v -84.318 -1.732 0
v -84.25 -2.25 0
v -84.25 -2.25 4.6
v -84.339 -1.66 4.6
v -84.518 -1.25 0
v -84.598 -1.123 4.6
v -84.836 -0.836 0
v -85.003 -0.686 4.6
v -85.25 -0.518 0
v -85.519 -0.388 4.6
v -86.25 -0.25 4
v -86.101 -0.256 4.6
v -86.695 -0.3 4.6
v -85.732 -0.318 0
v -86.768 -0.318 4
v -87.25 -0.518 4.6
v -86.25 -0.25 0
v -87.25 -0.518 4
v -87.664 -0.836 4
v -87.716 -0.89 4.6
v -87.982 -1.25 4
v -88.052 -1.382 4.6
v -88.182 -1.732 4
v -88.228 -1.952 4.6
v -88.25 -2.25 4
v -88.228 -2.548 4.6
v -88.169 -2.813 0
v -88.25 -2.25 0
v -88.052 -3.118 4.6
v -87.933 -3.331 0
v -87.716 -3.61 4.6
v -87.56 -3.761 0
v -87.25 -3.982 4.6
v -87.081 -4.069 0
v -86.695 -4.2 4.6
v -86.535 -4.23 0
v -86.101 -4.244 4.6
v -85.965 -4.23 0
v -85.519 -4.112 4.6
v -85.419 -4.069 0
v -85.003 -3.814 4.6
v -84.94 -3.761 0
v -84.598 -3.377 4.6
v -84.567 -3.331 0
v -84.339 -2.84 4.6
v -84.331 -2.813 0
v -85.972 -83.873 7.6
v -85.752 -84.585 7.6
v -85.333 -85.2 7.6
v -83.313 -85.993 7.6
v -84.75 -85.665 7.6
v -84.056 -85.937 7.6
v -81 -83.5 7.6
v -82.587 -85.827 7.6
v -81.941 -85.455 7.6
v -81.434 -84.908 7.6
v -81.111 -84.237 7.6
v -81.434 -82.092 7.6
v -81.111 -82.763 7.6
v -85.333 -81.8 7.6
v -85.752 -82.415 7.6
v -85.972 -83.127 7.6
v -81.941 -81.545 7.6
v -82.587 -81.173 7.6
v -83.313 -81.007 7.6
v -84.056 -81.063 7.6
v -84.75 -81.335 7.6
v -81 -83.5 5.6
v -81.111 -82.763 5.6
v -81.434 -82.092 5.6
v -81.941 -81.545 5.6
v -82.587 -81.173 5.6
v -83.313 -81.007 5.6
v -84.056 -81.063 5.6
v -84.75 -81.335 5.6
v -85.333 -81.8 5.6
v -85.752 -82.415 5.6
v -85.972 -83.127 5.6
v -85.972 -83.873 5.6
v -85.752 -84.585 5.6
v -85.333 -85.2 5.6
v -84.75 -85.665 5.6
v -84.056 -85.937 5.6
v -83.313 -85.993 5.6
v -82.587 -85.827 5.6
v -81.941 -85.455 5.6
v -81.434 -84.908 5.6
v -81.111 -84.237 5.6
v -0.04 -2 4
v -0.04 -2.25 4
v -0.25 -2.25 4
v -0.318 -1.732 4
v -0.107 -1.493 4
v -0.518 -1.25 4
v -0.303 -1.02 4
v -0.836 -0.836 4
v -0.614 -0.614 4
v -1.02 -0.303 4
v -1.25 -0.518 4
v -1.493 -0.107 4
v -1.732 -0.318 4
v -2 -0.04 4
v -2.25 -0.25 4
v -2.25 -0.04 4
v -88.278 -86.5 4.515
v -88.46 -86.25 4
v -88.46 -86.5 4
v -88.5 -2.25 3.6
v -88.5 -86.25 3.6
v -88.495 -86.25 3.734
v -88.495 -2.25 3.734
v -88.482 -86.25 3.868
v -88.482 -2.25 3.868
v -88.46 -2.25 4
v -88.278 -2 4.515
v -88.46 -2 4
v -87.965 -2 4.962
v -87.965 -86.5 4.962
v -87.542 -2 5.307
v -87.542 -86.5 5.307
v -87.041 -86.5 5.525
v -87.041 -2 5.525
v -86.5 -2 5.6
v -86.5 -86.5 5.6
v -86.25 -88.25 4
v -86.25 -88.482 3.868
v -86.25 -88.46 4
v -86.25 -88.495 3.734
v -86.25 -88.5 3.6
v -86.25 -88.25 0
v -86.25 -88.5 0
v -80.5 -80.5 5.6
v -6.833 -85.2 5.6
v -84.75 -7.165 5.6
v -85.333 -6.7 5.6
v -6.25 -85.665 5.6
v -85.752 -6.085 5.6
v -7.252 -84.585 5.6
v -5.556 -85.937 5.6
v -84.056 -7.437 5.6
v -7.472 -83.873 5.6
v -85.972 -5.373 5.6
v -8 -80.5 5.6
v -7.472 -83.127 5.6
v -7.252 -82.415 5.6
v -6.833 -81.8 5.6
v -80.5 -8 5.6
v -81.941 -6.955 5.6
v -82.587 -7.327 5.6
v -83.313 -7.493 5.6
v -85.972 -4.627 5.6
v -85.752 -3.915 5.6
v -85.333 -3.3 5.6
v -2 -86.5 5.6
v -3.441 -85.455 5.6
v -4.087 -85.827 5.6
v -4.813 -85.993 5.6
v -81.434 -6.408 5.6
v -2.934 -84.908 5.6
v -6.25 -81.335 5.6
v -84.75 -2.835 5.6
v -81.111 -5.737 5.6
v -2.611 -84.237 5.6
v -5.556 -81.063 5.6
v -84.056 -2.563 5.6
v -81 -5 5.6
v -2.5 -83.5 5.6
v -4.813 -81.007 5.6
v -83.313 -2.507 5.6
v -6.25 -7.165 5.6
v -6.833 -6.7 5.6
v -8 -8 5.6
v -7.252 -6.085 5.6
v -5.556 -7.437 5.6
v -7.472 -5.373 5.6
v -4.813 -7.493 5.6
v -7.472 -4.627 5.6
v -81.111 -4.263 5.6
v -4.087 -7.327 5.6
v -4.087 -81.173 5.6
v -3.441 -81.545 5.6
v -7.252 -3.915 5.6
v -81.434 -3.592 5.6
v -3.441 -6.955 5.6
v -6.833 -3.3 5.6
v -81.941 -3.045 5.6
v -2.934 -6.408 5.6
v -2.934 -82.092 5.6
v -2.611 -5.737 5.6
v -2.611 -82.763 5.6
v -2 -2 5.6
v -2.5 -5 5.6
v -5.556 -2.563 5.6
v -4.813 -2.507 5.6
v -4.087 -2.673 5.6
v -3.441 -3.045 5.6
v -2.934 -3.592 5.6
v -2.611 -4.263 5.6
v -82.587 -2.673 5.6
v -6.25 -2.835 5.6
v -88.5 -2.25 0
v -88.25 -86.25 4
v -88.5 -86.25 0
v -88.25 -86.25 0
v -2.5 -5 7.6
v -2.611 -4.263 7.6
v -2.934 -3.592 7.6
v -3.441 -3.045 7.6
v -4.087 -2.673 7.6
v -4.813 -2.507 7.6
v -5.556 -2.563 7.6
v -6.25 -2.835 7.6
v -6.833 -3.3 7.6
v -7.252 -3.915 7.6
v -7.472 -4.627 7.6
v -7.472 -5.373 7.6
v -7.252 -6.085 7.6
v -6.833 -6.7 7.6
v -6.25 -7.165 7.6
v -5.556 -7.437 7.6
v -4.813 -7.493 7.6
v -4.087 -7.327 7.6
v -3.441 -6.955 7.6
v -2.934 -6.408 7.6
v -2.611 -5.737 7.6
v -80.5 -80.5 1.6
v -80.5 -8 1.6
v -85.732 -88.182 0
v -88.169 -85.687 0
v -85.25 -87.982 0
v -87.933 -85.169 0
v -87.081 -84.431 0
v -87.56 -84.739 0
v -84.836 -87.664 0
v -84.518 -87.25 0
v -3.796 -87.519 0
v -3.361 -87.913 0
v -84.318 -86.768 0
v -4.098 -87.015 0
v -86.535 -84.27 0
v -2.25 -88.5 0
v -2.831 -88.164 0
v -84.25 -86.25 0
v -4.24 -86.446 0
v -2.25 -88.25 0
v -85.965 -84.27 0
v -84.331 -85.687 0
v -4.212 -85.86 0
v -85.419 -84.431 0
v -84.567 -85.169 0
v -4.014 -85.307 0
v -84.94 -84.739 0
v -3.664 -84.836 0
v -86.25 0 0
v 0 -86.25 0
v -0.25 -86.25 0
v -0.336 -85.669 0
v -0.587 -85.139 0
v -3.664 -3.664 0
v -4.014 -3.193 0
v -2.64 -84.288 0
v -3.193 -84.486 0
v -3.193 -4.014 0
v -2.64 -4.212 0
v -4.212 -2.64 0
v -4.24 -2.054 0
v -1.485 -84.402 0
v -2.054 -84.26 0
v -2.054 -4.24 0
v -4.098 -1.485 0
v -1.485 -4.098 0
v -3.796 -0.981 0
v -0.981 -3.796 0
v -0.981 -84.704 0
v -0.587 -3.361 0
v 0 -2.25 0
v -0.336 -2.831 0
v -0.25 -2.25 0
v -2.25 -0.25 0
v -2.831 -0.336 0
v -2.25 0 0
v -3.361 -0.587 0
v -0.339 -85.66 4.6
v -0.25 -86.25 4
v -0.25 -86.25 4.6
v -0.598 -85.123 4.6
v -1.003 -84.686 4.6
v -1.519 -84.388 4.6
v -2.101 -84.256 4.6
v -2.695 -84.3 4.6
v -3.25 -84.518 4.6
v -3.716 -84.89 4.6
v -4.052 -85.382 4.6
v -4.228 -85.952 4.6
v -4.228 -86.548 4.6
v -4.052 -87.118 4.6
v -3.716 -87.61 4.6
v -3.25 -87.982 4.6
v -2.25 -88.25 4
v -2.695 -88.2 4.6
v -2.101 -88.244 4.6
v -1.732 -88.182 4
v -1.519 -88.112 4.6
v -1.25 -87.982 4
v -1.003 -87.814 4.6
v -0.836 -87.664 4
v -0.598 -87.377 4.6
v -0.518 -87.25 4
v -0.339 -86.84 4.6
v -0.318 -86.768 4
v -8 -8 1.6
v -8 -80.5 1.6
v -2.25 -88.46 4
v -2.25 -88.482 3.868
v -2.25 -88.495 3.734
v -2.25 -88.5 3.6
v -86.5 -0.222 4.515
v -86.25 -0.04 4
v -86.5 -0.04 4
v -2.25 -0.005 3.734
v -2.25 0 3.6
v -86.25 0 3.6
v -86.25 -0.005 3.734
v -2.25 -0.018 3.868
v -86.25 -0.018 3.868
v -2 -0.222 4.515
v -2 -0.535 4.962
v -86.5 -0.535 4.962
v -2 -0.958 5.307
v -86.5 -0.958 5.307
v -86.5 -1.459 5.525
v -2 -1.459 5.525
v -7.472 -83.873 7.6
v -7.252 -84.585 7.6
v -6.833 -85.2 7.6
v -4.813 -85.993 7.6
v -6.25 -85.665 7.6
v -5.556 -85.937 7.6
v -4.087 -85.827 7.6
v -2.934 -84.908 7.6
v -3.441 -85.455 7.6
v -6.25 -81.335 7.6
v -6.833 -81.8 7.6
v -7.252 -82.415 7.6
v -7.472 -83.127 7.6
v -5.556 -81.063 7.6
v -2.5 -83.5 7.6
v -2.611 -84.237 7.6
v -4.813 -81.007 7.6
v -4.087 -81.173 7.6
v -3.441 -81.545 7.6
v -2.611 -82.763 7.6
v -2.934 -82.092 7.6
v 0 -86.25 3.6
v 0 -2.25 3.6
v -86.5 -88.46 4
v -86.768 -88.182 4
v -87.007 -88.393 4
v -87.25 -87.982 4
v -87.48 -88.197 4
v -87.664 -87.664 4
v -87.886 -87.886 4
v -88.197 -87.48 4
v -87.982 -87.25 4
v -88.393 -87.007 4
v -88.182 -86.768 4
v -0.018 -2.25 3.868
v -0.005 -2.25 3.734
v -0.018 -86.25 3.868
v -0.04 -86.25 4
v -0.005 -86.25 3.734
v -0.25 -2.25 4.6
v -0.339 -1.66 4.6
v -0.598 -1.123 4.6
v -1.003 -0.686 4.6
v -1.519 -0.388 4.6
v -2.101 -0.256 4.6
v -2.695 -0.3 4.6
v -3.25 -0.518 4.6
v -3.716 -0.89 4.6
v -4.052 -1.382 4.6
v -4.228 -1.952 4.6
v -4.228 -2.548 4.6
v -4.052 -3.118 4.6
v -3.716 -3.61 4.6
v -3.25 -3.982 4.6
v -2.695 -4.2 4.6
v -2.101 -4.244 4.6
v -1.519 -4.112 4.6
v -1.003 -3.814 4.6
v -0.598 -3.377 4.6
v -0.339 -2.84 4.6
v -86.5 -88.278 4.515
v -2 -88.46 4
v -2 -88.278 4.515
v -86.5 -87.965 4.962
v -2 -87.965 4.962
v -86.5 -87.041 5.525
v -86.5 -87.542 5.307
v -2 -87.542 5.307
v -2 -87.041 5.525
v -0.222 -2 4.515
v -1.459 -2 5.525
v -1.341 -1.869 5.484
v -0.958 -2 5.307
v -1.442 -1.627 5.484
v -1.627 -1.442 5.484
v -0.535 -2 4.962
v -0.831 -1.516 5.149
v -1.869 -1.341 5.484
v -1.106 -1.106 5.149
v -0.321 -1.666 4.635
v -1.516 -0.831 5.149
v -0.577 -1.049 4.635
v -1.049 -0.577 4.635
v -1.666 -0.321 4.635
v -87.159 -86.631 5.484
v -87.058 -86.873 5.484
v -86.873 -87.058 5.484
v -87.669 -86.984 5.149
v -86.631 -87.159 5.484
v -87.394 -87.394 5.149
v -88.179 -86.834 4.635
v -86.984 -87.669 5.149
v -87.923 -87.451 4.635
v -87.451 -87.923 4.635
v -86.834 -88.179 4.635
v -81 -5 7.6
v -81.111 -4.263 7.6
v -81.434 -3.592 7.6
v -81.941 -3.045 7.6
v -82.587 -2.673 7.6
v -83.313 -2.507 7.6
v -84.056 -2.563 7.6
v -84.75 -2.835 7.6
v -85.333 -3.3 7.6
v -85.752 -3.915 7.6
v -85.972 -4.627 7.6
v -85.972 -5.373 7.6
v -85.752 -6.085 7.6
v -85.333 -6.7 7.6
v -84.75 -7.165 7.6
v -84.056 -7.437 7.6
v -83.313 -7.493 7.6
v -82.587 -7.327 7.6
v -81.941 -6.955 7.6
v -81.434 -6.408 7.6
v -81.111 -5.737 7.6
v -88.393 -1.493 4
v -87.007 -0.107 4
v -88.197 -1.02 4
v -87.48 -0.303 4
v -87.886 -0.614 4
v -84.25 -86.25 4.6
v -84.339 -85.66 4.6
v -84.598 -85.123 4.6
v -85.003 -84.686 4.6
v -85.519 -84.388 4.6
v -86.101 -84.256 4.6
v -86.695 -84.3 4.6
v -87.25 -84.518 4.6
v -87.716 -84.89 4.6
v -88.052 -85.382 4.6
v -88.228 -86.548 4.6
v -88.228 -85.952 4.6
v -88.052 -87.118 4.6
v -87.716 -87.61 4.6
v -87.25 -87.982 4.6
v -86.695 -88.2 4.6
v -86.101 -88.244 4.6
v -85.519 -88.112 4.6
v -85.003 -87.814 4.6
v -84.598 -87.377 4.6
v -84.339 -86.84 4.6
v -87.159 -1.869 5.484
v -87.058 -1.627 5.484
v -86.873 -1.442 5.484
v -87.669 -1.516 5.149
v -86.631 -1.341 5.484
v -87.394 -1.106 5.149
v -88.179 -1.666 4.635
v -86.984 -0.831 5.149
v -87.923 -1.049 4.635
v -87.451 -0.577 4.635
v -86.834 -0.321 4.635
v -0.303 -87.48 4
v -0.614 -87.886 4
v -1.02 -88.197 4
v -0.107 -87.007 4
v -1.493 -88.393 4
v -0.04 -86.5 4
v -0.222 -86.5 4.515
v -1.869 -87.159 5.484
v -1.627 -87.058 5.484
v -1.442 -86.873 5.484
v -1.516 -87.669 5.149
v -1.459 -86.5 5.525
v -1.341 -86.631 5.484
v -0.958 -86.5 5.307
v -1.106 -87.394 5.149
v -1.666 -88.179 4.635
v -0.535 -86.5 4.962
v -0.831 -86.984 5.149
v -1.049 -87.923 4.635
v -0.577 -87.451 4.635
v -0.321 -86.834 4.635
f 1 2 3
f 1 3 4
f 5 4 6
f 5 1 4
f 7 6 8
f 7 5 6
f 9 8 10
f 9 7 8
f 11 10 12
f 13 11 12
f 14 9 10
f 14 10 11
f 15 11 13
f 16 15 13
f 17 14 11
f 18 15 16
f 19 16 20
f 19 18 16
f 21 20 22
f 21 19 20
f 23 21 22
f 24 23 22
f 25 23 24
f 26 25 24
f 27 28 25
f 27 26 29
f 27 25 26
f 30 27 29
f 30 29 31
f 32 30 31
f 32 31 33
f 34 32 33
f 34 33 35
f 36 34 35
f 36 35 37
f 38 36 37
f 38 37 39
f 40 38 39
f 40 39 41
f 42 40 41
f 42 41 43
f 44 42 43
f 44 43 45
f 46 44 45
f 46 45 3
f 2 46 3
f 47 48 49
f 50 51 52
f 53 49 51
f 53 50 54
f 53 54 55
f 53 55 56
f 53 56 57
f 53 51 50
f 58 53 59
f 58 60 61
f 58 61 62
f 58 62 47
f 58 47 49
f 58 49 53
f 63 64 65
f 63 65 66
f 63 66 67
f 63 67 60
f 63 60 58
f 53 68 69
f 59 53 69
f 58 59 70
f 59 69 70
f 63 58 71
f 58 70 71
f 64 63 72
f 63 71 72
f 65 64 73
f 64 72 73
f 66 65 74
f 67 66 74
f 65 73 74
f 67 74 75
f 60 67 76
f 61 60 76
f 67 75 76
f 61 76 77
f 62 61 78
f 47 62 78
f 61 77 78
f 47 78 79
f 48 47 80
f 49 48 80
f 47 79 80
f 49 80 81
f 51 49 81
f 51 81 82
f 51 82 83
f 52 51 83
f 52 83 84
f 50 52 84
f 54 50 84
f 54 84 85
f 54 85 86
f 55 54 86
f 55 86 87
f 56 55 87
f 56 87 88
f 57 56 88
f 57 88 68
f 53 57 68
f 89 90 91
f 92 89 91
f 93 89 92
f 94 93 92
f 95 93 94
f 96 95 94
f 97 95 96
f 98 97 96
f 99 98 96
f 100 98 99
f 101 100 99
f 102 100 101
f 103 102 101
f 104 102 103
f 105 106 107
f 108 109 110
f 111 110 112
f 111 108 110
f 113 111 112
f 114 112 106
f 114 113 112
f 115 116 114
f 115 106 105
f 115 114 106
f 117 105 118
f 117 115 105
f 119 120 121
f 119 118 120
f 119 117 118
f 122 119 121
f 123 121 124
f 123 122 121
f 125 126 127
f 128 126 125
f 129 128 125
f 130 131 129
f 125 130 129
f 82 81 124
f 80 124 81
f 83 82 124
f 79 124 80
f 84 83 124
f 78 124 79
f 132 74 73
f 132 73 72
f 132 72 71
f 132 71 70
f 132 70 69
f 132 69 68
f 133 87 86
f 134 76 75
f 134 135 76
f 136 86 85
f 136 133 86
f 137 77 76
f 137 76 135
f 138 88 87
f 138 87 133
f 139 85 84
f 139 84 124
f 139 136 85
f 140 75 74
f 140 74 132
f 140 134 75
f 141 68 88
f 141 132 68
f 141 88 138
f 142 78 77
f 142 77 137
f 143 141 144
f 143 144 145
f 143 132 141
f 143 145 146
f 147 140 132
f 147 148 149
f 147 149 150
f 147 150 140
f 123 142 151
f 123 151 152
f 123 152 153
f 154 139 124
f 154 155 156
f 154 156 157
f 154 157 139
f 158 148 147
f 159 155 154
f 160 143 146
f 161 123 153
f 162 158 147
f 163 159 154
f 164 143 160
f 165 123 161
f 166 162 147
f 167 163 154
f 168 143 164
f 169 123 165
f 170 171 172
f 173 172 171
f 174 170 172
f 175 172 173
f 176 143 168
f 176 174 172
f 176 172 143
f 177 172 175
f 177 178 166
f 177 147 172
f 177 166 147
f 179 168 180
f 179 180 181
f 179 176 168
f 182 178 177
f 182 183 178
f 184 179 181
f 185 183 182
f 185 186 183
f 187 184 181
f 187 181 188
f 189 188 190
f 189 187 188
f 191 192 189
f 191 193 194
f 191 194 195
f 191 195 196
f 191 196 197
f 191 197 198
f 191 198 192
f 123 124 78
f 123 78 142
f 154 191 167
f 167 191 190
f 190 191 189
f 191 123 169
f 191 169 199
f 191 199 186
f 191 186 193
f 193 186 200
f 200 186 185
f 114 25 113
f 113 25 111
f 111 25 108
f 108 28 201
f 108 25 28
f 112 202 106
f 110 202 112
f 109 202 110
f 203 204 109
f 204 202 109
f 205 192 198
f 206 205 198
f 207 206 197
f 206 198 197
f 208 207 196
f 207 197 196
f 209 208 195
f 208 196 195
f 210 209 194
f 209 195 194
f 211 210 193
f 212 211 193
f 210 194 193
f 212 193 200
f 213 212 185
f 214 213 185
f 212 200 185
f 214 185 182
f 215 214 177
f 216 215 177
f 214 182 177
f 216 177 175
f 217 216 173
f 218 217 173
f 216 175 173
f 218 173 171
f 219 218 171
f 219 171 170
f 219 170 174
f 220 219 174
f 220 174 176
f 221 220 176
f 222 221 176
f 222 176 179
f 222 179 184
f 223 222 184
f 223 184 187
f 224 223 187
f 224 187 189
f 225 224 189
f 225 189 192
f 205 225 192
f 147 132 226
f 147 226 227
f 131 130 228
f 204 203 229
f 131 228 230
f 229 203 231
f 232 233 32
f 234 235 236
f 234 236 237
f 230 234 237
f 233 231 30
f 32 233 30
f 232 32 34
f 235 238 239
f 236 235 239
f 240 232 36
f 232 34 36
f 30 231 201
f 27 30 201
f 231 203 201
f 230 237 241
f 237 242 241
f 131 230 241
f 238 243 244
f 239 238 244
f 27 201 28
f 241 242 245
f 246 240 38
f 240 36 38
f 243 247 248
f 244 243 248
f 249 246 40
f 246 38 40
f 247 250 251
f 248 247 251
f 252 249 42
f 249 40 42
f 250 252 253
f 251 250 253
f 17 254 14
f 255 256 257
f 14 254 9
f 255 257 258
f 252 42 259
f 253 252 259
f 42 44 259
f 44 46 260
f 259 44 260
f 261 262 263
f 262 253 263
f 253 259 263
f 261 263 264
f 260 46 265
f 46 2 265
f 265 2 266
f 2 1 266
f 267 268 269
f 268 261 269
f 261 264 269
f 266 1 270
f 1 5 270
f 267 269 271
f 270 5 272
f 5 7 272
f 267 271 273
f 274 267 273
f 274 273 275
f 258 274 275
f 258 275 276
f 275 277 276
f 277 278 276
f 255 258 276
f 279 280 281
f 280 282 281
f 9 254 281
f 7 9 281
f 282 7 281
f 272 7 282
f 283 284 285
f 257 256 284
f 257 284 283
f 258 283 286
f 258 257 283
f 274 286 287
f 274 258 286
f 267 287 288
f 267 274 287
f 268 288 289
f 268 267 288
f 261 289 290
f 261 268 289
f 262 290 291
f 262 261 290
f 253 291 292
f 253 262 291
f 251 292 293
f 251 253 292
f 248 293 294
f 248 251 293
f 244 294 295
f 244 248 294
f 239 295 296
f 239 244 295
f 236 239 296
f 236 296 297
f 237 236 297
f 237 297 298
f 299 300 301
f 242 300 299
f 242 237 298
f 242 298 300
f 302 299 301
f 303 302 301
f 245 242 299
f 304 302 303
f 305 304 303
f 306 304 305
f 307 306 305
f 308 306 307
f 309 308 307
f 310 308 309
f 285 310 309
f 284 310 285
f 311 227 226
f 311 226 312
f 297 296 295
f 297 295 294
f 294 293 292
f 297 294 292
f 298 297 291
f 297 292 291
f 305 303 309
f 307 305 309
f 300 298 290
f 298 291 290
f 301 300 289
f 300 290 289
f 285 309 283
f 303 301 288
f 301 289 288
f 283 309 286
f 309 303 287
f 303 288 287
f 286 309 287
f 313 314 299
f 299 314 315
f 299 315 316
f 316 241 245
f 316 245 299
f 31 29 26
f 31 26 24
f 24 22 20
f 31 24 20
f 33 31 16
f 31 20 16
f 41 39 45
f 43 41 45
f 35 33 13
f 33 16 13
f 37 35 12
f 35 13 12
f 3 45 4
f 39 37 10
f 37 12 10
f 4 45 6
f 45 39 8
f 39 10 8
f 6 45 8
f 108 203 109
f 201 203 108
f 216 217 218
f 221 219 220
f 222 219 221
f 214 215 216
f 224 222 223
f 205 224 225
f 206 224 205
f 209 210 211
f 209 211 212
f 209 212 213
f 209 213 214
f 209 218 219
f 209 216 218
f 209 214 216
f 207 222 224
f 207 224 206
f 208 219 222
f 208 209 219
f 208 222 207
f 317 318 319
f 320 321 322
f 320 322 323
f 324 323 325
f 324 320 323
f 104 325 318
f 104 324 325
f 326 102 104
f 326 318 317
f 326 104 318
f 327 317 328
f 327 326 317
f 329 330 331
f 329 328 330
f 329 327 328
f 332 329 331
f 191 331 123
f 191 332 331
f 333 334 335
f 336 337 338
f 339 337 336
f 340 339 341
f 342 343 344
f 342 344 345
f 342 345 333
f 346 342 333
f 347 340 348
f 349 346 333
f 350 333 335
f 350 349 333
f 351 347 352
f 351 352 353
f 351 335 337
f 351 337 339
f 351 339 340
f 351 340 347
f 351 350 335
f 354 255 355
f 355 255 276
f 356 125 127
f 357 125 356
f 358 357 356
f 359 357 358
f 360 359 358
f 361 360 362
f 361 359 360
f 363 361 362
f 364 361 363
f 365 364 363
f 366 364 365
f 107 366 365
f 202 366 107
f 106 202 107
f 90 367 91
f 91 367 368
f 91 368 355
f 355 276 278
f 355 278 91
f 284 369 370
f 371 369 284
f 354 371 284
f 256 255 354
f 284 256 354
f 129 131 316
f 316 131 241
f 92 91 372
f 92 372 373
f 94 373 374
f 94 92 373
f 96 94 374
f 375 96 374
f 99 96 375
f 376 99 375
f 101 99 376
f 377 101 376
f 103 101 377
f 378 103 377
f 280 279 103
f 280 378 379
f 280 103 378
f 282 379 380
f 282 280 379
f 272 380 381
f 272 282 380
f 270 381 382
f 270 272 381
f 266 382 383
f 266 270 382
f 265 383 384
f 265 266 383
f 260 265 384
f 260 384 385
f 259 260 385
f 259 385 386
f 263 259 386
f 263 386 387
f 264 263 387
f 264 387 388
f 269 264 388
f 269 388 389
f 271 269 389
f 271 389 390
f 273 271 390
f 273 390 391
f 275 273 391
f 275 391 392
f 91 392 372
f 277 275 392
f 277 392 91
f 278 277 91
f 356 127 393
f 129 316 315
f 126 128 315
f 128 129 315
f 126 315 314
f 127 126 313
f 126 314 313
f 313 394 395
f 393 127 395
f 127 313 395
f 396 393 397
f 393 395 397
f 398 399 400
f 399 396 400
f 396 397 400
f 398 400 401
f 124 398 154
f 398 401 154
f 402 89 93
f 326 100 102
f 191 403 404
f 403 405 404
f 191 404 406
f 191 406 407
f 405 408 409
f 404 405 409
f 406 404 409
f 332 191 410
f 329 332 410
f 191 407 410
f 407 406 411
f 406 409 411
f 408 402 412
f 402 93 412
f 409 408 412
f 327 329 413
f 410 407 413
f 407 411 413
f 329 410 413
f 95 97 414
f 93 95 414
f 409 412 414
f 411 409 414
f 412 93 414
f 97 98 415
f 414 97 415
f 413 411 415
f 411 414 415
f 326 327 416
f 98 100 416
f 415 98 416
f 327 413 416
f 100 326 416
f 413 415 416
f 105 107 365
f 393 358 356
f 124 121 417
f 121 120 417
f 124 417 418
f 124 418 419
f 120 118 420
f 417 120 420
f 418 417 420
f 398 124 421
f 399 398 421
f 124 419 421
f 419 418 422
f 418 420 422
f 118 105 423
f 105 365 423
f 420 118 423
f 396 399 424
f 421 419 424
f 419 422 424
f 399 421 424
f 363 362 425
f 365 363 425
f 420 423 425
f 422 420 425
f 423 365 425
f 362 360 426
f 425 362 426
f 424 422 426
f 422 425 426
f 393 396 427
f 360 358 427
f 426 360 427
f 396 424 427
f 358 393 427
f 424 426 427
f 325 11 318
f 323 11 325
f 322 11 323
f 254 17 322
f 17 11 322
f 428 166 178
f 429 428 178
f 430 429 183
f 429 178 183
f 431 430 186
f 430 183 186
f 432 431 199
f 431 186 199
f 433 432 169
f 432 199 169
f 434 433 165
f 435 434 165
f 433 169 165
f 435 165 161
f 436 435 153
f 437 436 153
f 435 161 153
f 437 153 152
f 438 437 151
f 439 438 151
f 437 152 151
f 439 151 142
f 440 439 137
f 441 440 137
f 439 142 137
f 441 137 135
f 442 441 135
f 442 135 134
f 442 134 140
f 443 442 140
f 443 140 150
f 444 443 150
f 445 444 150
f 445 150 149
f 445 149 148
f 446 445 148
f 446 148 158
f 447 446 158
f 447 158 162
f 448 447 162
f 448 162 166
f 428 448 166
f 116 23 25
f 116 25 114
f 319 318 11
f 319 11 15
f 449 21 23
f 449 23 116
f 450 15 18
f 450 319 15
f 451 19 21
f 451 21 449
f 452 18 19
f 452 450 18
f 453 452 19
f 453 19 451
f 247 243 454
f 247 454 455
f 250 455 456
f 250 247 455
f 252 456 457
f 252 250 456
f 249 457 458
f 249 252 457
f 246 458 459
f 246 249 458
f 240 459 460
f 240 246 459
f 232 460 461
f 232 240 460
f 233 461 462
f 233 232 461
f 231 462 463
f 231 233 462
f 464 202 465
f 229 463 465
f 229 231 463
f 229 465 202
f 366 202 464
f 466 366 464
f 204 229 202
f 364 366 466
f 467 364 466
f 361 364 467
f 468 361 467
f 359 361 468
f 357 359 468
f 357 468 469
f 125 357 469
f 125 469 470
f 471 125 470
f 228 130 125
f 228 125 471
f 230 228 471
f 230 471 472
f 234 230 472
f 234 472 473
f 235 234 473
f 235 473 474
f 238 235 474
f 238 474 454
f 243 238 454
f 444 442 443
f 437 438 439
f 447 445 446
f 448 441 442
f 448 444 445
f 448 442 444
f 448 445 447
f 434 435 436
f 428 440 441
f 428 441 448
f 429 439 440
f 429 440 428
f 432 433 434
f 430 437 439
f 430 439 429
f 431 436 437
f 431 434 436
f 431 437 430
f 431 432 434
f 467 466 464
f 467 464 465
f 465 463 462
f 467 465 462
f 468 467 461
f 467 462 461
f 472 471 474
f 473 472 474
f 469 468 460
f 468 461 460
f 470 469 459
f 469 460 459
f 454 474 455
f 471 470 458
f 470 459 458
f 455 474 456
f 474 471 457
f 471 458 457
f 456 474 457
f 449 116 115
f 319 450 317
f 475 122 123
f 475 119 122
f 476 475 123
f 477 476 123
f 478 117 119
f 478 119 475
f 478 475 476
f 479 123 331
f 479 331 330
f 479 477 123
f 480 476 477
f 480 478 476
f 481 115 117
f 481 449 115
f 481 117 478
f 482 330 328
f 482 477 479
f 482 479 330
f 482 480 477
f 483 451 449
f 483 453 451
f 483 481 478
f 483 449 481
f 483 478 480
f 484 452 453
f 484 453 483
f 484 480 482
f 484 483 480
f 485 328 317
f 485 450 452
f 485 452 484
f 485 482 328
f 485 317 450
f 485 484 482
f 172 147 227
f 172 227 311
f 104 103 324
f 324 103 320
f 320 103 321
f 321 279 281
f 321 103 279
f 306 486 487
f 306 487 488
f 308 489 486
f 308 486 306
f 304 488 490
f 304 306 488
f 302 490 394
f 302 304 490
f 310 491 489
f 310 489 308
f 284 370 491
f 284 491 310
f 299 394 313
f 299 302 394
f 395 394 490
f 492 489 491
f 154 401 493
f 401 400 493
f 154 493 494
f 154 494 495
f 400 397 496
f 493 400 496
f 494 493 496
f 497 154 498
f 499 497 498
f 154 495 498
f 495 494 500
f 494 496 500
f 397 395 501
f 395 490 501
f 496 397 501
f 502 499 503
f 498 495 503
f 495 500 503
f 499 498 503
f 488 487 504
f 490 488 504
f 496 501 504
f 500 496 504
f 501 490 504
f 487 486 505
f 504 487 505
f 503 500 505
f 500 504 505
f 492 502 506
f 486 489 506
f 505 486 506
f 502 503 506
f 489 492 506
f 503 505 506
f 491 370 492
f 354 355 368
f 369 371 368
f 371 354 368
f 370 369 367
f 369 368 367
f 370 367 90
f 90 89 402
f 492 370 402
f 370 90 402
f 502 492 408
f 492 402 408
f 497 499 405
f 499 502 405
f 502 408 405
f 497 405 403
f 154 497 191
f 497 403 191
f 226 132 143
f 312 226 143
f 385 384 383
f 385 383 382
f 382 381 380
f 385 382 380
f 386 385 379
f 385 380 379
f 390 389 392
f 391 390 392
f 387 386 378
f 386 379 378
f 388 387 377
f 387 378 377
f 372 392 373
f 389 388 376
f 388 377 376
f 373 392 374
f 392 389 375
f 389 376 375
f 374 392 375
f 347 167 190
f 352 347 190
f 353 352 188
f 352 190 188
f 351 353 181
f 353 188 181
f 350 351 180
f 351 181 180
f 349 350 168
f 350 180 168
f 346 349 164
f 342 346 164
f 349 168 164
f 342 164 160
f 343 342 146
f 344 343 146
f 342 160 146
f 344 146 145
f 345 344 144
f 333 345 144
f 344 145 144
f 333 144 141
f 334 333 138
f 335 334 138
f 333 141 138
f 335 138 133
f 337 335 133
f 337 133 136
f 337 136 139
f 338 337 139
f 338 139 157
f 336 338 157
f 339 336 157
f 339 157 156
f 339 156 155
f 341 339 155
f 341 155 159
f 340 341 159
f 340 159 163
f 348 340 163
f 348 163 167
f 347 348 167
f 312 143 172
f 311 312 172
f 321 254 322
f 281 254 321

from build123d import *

# Parameters (mm, degrees)
SKETCH1_W           = 88.5
SKETCH1_H           = 88.5
SKETCH1_R           = 2
BOSS_EXTRUDE1_DEPTH = 4.6
SKETCH2_R           = 2.5
BOSS_EXTRUDE2_DEPTH = 3
SKETCH3_W           = 88.5
SKETCH3_H           = 88.5
BOSS_EXTRUDE3_DEPTH = 1
FILLET1_R           = 2
SKETCH4_W           = 2.25
SKETCH4_H           = 2.25
CUT_EXTRUDE1_DEPTH  = 4
SKETCH5_W           = 72.5
SKETCH5_H           = 72.5
CUT_EXTRUDE2_DEPTH  = 4


with BuildPart() as part:
    # Sketch1 → Boss-Extrude1 (new body)
    with BuildSketch(Plane.XY):
        with Locations((-44.25, -44.25)):
            Rectangle(SKETCH1_W, SKETCH1_H)
        with Locations((-86.25, -86.25)):
            Circle(SKETCH1_R, mode=Mode.SUBTRACT)
        with Locations((-2.25, -86.25)):
            Circle(SKETCH1_R, mode=Mode.SUBTRACT)
        with Locations((-2.25, -2.25)):
            Circle(SKETCH1_R, mode=Mode.SUBTRACT)
        with Locations((-86.25, -2.25)):
            Circle(SKETCH1_R, mode=Mode.SUBTRACT)
    extrude(amount=BOSS_EXTRUDE1_DEPTH)

    # Sketch2 → Boss-Extrude2 (add)
    with BuildSketch(Plane.XY.offset(4.6)):
        with Locations((-5, -83.5)):
            Circle(SKETCH2_R)
        with Locations((-83.5, -83.5)):
            Circle(SKETCH2_R)
        with Locations((-5, -5)):
            Circle(SKETCH2_R)
        with Locations((-83.5, -5)):
            Circle(SKETCH2_R)
    extrude(amount=BOSS_EXTRUDE2_DEPTH)

    # Sketch3 → Boss-Extrude3 (add)
    with BuildSketch(Plane.XY.offset(4.6)):
        with Locations((-44.25, -44.25)):
            Rectangle(SKETCH3_W, SKETCH3_H)
    extrude(amount=BOSS_EXTRUDE3_DEPTH)

    # Fillet1
    fillet1_edges = [part.edges().sort_by_distance(p)[0] for p in [
        (0, 0, 2.8),
        (0, -88.5, 2.8),
        (-88.5, -88.5, 2.8),
        (-88.5, 0, 2.8),
        (-88.5, -44.25, 5.6),
        (-44.25, -88.5, 5.6),
        (0, -44.25, 5.6),
        (-44.25, 0, 5.6),
    ]]
    fillet(fillet1_edges, radius=FILLET1_R)

    # Sketch4 → Cut-Extrude1 (cut)
    with BuildSketch(Plane(origin=(0, 0, 0), x_dir=(-1, 0, 0), z_dir=(0, 0, -1))):
        with Locations((87.375, -87.375)):
            Rectangle(SKETCH4_W, SKETCH4_H)
        with Locations((1.125, -87.375)):
            Rectangle(SKETCH4_W, SKETCH4_H)
        with Locations((87.375, -1.125)):
            Rectangle(SKETCH4_W, SKETCH4_H)
        with Locations((1.125, -1.125)):
            Rectangle(SKETCH4_W, SKETCH4_H)
    extrude(amount=-CUT_EXTRUDE1_DEPTH, mode=Mode.SUBTRACT)

    # Sketch5 → Cut-Extrude2 (cut)
    with BuildSketch(Plane.XY.offset(5.6)):
        with Locations((-44.25, -44.25)):
            Rectangle(SKETCH5_W, SKETCH5_H)
    extrude(amount=-CUT_EXTRUDE2_DEPTH, mode=Mode.SUBTRACT)


solid = part.part
